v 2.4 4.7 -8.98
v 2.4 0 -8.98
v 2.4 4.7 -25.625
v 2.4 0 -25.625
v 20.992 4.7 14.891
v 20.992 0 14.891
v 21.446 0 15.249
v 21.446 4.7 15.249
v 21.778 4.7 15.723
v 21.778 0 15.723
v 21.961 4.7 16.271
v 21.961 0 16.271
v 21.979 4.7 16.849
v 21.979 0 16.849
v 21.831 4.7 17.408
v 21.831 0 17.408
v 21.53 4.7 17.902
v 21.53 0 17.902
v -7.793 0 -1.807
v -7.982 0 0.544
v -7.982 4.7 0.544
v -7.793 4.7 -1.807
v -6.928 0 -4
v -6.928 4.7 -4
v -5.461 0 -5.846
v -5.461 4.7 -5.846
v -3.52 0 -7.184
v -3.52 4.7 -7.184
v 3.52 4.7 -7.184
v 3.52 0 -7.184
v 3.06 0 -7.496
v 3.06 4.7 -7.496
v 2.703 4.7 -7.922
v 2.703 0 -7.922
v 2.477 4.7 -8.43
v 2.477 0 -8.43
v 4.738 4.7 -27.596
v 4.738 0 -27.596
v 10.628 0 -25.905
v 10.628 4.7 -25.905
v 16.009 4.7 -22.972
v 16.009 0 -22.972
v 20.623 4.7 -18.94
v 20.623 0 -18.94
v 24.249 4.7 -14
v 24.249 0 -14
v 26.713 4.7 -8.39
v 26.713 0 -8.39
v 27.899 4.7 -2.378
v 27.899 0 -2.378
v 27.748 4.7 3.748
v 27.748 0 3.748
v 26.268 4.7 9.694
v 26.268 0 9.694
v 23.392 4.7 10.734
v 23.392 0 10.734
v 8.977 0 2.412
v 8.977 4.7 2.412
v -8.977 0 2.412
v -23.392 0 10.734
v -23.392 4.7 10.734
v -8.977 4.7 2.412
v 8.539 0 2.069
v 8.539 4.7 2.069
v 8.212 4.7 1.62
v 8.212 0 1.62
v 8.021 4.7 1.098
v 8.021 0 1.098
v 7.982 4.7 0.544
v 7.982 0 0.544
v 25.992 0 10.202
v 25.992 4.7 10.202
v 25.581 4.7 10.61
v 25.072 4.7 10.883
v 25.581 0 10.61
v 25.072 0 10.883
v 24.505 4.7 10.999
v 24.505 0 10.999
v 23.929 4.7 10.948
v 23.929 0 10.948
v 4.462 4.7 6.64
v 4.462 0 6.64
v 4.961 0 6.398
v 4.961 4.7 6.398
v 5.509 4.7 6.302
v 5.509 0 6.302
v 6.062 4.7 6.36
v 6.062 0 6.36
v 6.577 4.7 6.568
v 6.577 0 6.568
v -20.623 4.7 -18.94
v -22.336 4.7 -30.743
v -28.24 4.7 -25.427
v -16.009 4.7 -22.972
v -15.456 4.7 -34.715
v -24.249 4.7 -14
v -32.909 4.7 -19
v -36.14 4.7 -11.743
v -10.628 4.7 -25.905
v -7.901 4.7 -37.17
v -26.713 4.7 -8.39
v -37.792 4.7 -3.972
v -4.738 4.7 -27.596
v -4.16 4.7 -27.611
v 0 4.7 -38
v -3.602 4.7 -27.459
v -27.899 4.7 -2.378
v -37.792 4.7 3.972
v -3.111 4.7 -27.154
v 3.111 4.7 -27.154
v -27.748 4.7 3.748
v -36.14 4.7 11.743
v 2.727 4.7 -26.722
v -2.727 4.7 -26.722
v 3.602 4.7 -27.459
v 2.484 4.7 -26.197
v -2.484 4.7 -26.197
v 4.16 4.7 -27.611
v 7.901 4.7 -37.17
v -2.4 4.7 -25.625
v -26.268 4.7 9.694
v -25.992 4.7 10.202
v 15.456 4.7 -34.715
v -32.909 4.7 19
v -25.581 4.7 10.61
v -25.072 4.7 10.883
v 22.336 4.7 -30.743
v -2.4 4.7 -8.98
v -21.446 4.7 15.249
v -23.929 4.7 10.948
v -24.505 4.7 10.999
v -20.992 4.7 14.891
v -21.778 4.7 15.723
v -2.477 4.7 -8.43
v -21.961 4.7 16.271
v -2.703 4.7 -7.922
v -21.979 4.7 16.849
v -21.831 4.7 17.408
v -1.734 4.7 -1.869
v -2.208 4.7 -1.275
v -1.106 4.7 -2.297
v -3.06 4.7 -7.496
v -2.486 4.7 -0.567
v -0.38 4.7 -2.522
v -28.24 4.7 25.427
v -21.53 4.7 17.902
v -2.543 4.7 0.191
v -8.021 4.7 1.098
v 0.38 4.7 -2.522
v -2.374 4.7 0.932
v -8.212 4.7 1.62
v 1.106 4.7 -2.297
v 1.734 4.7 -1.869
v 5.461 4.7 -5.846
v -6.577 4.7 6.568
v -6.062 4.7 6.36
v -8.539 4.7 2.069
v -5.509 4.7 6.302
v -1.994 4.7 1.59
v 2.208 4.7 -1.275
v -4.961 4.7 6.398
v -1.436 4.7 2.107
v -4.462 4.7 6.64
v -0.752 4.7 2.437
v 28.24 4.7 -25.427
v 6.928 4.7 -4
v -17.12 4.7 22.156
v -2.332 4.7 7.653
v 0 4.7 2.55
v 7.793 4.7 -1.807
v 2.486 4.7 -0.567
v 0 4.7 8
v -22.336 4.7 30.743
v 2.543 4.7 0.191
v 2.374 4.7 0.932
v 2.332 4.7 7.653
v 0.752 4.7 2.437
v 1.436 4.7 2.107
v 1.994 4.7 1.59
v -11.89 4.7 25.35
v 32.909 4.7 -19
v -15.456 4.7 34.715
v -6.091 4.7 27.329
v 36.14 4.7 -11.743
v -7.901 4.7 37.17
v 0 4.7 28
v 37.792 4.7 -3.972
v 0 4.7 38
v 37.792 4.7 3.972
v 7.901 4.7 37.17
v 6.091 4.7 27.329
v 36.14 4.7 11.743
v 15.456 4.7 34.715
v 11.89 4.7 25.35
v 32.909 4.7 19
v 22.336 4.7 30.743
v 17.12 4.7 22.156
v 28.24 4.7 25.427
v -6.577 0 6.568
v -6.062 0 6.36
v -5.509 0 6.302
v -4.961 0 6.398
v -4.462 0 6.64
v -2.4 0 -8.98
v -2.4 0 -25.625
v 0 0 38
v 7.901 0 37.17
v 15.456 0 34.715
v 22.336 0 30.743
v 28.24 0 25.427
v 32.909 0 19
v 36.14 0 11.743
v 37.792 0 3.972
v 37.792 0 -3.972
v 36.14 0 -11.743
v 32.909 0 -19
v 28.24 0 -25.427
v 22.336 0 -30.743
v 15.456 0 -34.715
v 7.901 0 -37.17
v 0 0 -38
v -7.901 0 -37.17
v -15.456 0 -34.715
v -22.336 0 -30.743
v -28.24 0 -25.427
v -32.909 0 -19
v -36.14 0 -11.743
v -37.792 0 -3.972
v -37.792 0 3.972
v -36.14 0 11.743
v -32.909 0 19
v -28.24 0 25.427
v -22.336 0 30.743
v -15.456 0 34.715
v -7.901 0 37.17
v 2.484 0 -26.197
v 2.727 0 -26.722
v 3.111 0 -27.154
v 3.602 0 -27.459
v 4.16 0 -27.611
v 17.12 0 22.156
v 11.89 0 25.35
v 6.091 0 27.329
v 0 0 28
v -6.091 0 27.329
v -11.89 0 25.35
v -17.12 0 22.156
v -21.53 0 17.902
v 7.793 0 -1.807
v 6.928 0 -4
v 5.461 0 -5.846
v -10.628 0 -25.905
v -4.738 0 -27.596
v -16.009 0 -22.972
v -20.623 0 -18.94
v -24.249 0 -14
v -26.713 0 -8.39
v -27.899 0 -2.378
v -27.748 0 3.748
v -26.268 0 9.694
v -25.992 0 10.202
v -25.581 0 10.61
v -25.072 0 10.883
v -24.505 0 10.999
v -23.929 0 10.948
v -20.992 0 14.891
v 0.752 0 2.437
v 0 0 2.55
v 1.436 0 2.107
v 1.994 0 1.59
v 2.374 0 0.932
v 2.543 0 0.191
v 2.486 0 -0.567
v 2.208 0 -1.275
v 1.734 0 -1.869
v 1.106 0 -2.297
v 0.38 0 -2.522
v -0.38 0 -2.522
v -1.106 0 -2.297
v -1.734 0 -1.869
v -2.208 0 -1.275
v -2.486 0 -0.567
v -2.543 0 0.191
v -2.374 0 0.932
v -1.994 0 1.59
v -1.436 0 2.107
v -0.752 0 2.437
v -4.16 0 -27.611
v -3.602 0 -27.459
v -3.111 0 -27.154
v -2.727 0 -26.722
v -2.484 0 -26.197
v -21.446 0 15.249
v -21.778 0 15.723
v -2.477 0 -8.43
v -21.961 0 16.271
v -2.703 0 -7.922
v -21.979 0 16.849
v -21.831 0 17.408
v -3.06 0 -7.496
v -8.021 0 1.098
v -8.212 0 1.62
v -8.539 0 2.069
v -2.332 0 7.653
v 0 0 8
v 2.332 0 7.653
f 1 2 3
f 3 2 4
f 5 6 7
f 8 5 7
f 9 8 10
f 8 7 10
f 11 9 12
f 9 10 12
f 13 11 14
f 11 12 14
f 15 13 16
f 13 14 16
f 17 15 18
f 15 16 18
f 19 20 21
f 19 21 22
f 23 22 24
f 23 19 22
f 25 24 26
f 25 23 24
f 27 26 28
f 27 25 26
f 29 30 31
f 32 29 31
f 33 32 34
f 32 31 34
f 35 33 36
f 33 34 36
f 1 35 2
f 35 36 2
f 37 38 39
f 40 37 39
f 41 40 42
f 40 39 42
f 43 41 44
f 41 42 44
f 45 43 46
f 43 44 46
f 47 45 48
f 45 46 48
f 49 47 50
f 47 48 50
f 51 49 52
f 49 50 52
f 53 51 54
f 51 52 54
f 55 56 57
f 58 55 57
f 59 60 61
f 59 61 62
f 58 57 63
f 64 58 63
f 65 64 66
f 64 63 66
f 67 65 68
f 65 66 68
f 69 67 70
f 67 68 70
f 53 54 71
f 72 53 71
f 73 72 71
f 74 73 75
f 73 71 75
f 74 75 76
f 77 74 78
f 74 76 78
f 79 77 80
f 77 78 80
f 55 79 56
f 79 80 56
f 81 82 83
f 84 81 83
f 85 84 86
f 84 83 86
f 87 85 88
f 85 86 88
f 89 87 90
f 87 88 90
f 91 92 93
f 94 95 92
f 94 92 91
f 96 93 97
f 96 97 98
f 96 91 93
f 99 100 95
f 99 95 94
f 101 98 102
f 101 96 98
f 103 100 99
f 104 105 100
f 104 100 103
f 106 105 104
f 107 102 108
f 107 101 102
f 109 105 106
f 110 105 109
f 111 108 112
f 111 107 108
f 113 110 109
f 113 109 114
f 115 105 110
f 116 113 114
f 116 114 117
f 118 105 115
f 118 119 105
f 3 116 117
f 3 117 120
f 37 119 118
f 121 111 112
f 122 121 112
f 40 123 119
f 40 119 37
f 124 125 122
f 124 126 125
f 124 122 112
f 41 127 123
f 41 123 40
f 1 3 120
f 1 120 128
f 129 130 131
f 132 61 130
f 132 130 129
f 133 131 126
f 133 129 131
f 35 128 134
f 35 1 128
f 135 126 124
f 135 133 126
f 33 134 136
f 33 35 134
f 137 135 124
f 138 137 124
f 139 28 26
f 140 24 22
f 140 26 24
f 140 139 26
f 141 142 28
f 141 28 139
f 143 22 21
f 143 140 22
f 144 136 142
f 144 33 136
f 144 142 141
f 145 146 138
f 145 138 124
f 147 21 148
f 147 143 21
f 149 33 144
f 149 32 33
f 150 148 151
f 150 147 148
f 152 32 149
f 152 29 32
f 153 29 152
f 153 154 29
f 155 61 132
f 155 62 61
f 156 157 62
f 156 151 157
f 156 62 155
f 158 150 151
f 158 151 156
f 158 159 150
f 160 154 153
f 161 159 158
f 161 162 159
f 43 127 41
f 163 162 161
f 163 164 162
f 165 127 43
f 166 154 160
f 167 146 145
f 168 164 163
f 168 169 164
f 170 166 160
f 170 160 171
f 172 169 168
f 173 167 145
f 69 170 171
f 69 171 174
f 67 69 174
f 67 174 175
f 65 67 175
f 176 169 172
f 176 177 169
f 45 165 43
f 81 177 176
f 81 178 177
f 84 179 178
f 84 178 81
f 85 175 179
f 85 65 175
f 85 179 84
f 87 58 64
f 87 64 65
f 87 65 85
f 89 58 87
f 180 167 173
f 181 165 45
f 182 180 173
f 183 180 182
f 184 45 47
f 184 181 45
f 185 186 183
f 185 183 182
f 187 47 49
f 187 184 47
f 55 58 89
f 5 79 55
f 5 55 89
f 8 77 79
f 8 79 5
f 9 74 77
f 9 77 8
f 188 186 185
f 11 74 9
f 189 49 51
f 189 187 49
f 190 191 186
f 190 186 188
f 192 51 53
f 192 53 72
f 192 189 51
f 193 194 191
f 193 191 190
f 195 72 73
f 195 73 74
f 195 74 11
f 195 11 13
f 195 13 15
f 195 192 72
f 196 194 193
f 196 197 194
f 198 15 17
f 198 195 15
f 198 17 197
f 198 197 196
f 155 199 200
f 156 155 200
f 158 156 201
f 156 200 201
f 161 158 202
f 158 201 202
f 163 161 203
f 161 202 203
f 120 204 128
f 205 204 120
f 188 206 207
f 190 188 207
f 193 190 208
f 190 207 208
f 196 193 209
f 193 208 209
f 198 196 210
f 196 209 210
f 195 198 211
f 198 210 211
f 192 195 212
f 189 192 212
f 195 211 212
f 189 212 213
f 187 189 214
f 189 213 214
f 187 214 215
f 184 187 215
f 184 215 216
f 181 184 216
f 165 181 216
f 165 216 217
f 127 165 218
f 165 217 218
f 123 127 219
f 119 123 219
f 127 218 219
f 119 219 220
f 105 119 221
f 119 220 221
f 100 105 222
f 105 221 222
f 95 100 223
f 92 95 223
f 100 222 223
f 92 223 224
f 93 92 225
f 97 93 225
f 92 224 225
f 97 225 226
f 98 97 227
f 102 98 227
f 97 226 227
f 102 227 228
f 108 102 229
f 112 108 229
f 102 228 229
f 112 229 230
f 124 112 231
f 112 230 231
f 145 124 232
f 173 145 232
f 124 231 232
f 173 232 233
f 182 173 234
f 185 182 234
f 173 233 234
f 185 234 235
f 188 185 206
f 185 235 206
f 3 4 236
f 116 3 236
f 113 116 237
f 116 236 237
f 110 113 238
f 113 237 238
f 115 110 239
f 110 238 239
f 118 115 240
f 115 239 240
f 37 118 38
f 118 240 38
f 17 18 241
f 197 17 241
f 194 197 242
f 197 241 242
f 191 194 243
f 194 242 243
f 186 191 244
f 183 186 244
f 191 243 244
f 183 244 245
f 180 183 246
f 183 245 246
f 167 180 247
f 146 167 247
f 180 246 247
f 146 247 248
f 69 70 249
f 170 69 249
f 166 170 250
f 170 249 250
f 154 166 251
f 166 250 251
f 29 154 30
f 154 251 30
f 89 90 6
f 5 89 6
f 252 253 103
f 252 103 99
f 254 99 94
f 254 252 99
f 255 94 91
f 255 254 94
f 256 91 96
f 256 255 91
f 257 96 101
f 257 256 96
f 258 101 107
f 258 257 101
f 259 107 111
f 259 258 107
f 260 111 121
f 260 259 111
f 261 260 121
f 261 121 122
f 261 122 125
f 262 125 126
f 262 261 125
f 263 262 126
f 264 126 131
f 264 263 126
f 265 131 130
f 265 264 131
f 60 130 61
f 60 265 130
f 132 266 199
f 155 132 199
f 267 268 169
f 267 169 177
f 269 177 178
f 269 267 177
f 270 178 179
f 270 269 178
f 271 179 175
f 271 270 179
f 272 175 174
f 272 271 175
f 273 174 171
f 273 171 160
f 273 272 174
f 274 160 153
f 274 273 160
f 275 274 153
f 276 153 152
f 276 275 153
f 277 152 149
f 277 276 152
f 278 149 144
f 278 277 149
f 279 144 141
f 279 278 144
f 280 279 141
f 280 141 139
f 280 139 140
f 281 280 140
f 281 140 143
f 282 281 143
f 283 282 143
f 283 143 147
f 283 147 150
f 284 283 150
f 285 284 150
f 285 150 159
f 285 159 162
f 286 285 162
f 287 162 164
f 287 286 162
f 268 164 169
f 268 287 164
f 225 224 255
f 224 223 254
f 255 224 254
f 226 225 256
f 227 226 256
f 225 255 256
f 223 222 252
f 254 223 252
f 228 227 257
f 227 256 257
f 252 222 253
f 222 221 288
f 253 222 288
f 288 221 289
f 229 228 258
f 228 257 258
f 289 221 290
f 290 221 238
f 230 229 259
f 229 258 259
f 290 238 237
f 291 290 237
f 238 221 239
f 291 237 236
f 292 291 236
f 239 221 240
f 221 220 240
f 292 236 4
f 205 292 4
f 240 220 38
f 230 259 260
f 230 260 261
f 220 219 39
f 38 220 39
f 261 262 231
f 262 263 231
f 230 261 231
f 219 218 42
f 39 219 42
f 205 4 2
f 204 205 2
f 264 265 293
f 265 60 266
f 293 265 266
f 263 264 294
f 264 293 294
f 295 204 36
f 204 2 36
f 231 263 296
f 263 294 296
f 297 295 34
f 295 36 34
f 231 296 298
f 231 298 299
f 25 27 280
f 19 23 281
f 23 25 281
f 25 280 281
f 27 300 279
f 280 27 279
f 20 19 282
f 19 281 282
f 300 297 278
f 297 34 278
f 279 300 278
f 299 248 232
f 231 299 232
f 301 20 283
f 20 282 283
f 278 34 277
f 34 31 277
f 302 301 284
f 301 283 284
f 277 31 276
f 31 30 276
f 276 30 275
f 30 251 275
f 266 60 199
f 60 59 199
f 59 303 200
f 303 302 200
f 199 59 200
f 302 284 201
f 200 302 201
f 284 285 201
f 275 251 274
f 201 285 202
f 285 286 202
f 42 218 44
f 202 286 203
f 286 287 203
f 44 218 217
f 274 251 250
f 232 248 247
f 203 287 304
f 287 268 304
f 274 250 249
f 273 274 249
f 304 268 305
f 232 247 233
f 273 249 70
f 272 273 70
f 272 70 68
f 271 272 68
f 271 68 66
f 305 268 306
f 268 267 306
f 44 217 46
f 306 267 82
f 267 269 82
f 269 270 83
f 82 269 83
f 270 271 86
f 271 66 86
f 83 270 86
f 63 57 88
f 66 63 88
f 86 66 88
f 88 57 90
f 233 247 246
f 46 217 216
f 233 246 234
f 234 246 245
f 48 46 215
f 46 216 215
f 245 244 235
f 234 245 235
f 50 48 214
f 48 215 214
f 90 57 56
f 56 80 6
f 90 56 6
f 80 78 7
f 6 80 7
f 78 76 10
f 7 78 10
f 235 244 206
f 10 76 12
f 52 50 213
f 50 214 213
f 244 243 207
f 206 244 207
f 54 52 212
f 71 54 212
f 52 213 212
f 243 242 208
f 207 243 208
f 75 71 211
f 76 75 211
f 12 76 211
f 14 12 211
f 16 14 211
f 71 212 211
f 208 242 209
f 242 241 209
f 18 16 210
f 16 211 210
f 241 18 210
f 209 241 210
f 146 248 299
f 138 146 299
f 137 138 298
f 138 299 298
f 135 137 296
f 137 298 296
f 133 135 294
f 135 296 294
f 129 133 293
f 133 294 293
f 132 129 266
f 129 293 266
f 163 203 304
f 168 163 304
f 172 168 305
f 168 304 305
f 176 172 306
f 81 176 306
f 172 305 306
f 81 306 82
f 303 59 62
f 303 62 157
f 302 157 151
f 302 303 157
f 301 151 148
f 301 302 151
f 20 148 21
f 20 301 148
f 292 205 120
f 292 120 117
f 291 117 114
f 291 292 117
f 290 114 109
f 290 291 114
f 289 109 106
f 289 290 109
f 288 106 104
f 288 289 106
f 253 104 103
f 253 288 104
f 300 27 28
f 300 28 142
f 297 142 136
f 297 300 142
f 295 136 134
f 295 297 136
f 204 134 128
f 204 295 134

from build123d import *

# Parameters (mm, degrees)
SKETCH1_R           = 38
SKETCH1_R_2         = 2.55
BOSS_EXTRUDE1_DEPTH = 4.7


with BuildPart() as part:
    # Sketch1 → Boss-Extrude1 (new body)
    with BuildSketch(Plane(origin=(0, 0, 0), x_dir=(1, 0, 0), z_dir=(0, 1, 0))):
        with Locations(Location((0, 0, 0), (0, 0, 270))):
            Circle(SKETCH1_R)
        with Locations(Location((0, 0, 0), (0, 0, 270))):
            Circle(SKETCH1_R_2, mode=Mode.SUBTRACT)
        with BuildLine():
            Line((2.4, 8.979977728), (2.4, 25.624987805))
            ThreePointArc((2.4, 25.624987805), (3.110993227, 27.154190714), (4.738461538, 27.596140713))
            ThreePointArc((4.738461538, 27.596140713), (24.248711306, 14), (26.268189673, -9.694442289))
            ThreePointArc((26.268189673, -9.694442289), (25.071715591, -10.882896192), (23.391890411, -10.734032933))
            Line((23.391890411, -10.734032933), (8.976888838, -2.411527895))
            ThreePointArc((8.976888838, -2.411527895), (8.211845562, -1.620020671), (7.98151107, -0.54358167))
            ThreePointArc((7.98151107, -0.54358167), (6.92820323, 4), (3.52, 7.183982183))
            ThreePointArc((3.52, 7.183982183), (2.702943725, 7.921677204), (2.4, 8.979977728))
        make_face(mode=Mode.SUBTRACT)
        with BuildLine():
            Line((-2.4, 8.979977728), (-2.4, 25.624987805))
            ThreePointArc((-2.4, 25.624987805), (-3.110993227, 27.154190714), (-4.738461538, 27.596140713))
            ThreePointArc((-4.738461538, 27.596140713), (-24.248711306, 14), (-26.268189673, -9.694442289))
            ThreePointArc((-26.268189673, -9.694442289), (-25.071715591, -10.882896192), (-23.391890411, -10.734032933))
            Line((-23.391890411, -10.734032933), (-8.976888838, -2.411527895))
            ThreePointArc((-8.976888838, -2.411527895), (-8.211845562, -1.620020671), (-7.98151107, -0.54358167))
            ThreePointArc((-7.98151107, -0.54358167), (-6.92820323, 4), (-3.52, 7.183982183))
            ThreePointArc((-3.52, 7.183982183), (-2.702943725, 7.921677204), (-2.4, 8.979977728))
        make_face(mode=Mode.SUBTRACT)
        with BuildLine():
            Line((6.576888838, -6.568449833), (20.991890411, -14.890954872))
            ThreePointArc((20.991890411, -14.890954872), (21.960722365, -16.271294523), (21.529728135, -17.901698424))
            ThreePointArc((21.529728135, -17.901698424), (0, -28), (-21.529728135, -17.901698424))
            ThreePointArc((-21.529728135, -17.901698424), (-21.960722365, -16.271294523), (-20.991890411, -14.890954872))
            Line((-20.991890411, -14.890954872), (-6.576888838, -6.568449833))
            ThreePointArc((-6.576888838, -6.568449833), (-5.508901837, -6.301656533), (-4.46151107, -6.640400513))
            ThreePointArc((-4.46151107, -6.640400513), (0, -8), (4.46151107, -6.640400513))
            ThreePointArc((4.46151107, -6.640400513), (5.508901837, -6.301656533), (6.576888838, -6.568449833))
        make_face(mode=Mode.SUBTRACT)
    extrude(amount=BOSS_EXTRUDE1_DEPTH)


solid = part.part
